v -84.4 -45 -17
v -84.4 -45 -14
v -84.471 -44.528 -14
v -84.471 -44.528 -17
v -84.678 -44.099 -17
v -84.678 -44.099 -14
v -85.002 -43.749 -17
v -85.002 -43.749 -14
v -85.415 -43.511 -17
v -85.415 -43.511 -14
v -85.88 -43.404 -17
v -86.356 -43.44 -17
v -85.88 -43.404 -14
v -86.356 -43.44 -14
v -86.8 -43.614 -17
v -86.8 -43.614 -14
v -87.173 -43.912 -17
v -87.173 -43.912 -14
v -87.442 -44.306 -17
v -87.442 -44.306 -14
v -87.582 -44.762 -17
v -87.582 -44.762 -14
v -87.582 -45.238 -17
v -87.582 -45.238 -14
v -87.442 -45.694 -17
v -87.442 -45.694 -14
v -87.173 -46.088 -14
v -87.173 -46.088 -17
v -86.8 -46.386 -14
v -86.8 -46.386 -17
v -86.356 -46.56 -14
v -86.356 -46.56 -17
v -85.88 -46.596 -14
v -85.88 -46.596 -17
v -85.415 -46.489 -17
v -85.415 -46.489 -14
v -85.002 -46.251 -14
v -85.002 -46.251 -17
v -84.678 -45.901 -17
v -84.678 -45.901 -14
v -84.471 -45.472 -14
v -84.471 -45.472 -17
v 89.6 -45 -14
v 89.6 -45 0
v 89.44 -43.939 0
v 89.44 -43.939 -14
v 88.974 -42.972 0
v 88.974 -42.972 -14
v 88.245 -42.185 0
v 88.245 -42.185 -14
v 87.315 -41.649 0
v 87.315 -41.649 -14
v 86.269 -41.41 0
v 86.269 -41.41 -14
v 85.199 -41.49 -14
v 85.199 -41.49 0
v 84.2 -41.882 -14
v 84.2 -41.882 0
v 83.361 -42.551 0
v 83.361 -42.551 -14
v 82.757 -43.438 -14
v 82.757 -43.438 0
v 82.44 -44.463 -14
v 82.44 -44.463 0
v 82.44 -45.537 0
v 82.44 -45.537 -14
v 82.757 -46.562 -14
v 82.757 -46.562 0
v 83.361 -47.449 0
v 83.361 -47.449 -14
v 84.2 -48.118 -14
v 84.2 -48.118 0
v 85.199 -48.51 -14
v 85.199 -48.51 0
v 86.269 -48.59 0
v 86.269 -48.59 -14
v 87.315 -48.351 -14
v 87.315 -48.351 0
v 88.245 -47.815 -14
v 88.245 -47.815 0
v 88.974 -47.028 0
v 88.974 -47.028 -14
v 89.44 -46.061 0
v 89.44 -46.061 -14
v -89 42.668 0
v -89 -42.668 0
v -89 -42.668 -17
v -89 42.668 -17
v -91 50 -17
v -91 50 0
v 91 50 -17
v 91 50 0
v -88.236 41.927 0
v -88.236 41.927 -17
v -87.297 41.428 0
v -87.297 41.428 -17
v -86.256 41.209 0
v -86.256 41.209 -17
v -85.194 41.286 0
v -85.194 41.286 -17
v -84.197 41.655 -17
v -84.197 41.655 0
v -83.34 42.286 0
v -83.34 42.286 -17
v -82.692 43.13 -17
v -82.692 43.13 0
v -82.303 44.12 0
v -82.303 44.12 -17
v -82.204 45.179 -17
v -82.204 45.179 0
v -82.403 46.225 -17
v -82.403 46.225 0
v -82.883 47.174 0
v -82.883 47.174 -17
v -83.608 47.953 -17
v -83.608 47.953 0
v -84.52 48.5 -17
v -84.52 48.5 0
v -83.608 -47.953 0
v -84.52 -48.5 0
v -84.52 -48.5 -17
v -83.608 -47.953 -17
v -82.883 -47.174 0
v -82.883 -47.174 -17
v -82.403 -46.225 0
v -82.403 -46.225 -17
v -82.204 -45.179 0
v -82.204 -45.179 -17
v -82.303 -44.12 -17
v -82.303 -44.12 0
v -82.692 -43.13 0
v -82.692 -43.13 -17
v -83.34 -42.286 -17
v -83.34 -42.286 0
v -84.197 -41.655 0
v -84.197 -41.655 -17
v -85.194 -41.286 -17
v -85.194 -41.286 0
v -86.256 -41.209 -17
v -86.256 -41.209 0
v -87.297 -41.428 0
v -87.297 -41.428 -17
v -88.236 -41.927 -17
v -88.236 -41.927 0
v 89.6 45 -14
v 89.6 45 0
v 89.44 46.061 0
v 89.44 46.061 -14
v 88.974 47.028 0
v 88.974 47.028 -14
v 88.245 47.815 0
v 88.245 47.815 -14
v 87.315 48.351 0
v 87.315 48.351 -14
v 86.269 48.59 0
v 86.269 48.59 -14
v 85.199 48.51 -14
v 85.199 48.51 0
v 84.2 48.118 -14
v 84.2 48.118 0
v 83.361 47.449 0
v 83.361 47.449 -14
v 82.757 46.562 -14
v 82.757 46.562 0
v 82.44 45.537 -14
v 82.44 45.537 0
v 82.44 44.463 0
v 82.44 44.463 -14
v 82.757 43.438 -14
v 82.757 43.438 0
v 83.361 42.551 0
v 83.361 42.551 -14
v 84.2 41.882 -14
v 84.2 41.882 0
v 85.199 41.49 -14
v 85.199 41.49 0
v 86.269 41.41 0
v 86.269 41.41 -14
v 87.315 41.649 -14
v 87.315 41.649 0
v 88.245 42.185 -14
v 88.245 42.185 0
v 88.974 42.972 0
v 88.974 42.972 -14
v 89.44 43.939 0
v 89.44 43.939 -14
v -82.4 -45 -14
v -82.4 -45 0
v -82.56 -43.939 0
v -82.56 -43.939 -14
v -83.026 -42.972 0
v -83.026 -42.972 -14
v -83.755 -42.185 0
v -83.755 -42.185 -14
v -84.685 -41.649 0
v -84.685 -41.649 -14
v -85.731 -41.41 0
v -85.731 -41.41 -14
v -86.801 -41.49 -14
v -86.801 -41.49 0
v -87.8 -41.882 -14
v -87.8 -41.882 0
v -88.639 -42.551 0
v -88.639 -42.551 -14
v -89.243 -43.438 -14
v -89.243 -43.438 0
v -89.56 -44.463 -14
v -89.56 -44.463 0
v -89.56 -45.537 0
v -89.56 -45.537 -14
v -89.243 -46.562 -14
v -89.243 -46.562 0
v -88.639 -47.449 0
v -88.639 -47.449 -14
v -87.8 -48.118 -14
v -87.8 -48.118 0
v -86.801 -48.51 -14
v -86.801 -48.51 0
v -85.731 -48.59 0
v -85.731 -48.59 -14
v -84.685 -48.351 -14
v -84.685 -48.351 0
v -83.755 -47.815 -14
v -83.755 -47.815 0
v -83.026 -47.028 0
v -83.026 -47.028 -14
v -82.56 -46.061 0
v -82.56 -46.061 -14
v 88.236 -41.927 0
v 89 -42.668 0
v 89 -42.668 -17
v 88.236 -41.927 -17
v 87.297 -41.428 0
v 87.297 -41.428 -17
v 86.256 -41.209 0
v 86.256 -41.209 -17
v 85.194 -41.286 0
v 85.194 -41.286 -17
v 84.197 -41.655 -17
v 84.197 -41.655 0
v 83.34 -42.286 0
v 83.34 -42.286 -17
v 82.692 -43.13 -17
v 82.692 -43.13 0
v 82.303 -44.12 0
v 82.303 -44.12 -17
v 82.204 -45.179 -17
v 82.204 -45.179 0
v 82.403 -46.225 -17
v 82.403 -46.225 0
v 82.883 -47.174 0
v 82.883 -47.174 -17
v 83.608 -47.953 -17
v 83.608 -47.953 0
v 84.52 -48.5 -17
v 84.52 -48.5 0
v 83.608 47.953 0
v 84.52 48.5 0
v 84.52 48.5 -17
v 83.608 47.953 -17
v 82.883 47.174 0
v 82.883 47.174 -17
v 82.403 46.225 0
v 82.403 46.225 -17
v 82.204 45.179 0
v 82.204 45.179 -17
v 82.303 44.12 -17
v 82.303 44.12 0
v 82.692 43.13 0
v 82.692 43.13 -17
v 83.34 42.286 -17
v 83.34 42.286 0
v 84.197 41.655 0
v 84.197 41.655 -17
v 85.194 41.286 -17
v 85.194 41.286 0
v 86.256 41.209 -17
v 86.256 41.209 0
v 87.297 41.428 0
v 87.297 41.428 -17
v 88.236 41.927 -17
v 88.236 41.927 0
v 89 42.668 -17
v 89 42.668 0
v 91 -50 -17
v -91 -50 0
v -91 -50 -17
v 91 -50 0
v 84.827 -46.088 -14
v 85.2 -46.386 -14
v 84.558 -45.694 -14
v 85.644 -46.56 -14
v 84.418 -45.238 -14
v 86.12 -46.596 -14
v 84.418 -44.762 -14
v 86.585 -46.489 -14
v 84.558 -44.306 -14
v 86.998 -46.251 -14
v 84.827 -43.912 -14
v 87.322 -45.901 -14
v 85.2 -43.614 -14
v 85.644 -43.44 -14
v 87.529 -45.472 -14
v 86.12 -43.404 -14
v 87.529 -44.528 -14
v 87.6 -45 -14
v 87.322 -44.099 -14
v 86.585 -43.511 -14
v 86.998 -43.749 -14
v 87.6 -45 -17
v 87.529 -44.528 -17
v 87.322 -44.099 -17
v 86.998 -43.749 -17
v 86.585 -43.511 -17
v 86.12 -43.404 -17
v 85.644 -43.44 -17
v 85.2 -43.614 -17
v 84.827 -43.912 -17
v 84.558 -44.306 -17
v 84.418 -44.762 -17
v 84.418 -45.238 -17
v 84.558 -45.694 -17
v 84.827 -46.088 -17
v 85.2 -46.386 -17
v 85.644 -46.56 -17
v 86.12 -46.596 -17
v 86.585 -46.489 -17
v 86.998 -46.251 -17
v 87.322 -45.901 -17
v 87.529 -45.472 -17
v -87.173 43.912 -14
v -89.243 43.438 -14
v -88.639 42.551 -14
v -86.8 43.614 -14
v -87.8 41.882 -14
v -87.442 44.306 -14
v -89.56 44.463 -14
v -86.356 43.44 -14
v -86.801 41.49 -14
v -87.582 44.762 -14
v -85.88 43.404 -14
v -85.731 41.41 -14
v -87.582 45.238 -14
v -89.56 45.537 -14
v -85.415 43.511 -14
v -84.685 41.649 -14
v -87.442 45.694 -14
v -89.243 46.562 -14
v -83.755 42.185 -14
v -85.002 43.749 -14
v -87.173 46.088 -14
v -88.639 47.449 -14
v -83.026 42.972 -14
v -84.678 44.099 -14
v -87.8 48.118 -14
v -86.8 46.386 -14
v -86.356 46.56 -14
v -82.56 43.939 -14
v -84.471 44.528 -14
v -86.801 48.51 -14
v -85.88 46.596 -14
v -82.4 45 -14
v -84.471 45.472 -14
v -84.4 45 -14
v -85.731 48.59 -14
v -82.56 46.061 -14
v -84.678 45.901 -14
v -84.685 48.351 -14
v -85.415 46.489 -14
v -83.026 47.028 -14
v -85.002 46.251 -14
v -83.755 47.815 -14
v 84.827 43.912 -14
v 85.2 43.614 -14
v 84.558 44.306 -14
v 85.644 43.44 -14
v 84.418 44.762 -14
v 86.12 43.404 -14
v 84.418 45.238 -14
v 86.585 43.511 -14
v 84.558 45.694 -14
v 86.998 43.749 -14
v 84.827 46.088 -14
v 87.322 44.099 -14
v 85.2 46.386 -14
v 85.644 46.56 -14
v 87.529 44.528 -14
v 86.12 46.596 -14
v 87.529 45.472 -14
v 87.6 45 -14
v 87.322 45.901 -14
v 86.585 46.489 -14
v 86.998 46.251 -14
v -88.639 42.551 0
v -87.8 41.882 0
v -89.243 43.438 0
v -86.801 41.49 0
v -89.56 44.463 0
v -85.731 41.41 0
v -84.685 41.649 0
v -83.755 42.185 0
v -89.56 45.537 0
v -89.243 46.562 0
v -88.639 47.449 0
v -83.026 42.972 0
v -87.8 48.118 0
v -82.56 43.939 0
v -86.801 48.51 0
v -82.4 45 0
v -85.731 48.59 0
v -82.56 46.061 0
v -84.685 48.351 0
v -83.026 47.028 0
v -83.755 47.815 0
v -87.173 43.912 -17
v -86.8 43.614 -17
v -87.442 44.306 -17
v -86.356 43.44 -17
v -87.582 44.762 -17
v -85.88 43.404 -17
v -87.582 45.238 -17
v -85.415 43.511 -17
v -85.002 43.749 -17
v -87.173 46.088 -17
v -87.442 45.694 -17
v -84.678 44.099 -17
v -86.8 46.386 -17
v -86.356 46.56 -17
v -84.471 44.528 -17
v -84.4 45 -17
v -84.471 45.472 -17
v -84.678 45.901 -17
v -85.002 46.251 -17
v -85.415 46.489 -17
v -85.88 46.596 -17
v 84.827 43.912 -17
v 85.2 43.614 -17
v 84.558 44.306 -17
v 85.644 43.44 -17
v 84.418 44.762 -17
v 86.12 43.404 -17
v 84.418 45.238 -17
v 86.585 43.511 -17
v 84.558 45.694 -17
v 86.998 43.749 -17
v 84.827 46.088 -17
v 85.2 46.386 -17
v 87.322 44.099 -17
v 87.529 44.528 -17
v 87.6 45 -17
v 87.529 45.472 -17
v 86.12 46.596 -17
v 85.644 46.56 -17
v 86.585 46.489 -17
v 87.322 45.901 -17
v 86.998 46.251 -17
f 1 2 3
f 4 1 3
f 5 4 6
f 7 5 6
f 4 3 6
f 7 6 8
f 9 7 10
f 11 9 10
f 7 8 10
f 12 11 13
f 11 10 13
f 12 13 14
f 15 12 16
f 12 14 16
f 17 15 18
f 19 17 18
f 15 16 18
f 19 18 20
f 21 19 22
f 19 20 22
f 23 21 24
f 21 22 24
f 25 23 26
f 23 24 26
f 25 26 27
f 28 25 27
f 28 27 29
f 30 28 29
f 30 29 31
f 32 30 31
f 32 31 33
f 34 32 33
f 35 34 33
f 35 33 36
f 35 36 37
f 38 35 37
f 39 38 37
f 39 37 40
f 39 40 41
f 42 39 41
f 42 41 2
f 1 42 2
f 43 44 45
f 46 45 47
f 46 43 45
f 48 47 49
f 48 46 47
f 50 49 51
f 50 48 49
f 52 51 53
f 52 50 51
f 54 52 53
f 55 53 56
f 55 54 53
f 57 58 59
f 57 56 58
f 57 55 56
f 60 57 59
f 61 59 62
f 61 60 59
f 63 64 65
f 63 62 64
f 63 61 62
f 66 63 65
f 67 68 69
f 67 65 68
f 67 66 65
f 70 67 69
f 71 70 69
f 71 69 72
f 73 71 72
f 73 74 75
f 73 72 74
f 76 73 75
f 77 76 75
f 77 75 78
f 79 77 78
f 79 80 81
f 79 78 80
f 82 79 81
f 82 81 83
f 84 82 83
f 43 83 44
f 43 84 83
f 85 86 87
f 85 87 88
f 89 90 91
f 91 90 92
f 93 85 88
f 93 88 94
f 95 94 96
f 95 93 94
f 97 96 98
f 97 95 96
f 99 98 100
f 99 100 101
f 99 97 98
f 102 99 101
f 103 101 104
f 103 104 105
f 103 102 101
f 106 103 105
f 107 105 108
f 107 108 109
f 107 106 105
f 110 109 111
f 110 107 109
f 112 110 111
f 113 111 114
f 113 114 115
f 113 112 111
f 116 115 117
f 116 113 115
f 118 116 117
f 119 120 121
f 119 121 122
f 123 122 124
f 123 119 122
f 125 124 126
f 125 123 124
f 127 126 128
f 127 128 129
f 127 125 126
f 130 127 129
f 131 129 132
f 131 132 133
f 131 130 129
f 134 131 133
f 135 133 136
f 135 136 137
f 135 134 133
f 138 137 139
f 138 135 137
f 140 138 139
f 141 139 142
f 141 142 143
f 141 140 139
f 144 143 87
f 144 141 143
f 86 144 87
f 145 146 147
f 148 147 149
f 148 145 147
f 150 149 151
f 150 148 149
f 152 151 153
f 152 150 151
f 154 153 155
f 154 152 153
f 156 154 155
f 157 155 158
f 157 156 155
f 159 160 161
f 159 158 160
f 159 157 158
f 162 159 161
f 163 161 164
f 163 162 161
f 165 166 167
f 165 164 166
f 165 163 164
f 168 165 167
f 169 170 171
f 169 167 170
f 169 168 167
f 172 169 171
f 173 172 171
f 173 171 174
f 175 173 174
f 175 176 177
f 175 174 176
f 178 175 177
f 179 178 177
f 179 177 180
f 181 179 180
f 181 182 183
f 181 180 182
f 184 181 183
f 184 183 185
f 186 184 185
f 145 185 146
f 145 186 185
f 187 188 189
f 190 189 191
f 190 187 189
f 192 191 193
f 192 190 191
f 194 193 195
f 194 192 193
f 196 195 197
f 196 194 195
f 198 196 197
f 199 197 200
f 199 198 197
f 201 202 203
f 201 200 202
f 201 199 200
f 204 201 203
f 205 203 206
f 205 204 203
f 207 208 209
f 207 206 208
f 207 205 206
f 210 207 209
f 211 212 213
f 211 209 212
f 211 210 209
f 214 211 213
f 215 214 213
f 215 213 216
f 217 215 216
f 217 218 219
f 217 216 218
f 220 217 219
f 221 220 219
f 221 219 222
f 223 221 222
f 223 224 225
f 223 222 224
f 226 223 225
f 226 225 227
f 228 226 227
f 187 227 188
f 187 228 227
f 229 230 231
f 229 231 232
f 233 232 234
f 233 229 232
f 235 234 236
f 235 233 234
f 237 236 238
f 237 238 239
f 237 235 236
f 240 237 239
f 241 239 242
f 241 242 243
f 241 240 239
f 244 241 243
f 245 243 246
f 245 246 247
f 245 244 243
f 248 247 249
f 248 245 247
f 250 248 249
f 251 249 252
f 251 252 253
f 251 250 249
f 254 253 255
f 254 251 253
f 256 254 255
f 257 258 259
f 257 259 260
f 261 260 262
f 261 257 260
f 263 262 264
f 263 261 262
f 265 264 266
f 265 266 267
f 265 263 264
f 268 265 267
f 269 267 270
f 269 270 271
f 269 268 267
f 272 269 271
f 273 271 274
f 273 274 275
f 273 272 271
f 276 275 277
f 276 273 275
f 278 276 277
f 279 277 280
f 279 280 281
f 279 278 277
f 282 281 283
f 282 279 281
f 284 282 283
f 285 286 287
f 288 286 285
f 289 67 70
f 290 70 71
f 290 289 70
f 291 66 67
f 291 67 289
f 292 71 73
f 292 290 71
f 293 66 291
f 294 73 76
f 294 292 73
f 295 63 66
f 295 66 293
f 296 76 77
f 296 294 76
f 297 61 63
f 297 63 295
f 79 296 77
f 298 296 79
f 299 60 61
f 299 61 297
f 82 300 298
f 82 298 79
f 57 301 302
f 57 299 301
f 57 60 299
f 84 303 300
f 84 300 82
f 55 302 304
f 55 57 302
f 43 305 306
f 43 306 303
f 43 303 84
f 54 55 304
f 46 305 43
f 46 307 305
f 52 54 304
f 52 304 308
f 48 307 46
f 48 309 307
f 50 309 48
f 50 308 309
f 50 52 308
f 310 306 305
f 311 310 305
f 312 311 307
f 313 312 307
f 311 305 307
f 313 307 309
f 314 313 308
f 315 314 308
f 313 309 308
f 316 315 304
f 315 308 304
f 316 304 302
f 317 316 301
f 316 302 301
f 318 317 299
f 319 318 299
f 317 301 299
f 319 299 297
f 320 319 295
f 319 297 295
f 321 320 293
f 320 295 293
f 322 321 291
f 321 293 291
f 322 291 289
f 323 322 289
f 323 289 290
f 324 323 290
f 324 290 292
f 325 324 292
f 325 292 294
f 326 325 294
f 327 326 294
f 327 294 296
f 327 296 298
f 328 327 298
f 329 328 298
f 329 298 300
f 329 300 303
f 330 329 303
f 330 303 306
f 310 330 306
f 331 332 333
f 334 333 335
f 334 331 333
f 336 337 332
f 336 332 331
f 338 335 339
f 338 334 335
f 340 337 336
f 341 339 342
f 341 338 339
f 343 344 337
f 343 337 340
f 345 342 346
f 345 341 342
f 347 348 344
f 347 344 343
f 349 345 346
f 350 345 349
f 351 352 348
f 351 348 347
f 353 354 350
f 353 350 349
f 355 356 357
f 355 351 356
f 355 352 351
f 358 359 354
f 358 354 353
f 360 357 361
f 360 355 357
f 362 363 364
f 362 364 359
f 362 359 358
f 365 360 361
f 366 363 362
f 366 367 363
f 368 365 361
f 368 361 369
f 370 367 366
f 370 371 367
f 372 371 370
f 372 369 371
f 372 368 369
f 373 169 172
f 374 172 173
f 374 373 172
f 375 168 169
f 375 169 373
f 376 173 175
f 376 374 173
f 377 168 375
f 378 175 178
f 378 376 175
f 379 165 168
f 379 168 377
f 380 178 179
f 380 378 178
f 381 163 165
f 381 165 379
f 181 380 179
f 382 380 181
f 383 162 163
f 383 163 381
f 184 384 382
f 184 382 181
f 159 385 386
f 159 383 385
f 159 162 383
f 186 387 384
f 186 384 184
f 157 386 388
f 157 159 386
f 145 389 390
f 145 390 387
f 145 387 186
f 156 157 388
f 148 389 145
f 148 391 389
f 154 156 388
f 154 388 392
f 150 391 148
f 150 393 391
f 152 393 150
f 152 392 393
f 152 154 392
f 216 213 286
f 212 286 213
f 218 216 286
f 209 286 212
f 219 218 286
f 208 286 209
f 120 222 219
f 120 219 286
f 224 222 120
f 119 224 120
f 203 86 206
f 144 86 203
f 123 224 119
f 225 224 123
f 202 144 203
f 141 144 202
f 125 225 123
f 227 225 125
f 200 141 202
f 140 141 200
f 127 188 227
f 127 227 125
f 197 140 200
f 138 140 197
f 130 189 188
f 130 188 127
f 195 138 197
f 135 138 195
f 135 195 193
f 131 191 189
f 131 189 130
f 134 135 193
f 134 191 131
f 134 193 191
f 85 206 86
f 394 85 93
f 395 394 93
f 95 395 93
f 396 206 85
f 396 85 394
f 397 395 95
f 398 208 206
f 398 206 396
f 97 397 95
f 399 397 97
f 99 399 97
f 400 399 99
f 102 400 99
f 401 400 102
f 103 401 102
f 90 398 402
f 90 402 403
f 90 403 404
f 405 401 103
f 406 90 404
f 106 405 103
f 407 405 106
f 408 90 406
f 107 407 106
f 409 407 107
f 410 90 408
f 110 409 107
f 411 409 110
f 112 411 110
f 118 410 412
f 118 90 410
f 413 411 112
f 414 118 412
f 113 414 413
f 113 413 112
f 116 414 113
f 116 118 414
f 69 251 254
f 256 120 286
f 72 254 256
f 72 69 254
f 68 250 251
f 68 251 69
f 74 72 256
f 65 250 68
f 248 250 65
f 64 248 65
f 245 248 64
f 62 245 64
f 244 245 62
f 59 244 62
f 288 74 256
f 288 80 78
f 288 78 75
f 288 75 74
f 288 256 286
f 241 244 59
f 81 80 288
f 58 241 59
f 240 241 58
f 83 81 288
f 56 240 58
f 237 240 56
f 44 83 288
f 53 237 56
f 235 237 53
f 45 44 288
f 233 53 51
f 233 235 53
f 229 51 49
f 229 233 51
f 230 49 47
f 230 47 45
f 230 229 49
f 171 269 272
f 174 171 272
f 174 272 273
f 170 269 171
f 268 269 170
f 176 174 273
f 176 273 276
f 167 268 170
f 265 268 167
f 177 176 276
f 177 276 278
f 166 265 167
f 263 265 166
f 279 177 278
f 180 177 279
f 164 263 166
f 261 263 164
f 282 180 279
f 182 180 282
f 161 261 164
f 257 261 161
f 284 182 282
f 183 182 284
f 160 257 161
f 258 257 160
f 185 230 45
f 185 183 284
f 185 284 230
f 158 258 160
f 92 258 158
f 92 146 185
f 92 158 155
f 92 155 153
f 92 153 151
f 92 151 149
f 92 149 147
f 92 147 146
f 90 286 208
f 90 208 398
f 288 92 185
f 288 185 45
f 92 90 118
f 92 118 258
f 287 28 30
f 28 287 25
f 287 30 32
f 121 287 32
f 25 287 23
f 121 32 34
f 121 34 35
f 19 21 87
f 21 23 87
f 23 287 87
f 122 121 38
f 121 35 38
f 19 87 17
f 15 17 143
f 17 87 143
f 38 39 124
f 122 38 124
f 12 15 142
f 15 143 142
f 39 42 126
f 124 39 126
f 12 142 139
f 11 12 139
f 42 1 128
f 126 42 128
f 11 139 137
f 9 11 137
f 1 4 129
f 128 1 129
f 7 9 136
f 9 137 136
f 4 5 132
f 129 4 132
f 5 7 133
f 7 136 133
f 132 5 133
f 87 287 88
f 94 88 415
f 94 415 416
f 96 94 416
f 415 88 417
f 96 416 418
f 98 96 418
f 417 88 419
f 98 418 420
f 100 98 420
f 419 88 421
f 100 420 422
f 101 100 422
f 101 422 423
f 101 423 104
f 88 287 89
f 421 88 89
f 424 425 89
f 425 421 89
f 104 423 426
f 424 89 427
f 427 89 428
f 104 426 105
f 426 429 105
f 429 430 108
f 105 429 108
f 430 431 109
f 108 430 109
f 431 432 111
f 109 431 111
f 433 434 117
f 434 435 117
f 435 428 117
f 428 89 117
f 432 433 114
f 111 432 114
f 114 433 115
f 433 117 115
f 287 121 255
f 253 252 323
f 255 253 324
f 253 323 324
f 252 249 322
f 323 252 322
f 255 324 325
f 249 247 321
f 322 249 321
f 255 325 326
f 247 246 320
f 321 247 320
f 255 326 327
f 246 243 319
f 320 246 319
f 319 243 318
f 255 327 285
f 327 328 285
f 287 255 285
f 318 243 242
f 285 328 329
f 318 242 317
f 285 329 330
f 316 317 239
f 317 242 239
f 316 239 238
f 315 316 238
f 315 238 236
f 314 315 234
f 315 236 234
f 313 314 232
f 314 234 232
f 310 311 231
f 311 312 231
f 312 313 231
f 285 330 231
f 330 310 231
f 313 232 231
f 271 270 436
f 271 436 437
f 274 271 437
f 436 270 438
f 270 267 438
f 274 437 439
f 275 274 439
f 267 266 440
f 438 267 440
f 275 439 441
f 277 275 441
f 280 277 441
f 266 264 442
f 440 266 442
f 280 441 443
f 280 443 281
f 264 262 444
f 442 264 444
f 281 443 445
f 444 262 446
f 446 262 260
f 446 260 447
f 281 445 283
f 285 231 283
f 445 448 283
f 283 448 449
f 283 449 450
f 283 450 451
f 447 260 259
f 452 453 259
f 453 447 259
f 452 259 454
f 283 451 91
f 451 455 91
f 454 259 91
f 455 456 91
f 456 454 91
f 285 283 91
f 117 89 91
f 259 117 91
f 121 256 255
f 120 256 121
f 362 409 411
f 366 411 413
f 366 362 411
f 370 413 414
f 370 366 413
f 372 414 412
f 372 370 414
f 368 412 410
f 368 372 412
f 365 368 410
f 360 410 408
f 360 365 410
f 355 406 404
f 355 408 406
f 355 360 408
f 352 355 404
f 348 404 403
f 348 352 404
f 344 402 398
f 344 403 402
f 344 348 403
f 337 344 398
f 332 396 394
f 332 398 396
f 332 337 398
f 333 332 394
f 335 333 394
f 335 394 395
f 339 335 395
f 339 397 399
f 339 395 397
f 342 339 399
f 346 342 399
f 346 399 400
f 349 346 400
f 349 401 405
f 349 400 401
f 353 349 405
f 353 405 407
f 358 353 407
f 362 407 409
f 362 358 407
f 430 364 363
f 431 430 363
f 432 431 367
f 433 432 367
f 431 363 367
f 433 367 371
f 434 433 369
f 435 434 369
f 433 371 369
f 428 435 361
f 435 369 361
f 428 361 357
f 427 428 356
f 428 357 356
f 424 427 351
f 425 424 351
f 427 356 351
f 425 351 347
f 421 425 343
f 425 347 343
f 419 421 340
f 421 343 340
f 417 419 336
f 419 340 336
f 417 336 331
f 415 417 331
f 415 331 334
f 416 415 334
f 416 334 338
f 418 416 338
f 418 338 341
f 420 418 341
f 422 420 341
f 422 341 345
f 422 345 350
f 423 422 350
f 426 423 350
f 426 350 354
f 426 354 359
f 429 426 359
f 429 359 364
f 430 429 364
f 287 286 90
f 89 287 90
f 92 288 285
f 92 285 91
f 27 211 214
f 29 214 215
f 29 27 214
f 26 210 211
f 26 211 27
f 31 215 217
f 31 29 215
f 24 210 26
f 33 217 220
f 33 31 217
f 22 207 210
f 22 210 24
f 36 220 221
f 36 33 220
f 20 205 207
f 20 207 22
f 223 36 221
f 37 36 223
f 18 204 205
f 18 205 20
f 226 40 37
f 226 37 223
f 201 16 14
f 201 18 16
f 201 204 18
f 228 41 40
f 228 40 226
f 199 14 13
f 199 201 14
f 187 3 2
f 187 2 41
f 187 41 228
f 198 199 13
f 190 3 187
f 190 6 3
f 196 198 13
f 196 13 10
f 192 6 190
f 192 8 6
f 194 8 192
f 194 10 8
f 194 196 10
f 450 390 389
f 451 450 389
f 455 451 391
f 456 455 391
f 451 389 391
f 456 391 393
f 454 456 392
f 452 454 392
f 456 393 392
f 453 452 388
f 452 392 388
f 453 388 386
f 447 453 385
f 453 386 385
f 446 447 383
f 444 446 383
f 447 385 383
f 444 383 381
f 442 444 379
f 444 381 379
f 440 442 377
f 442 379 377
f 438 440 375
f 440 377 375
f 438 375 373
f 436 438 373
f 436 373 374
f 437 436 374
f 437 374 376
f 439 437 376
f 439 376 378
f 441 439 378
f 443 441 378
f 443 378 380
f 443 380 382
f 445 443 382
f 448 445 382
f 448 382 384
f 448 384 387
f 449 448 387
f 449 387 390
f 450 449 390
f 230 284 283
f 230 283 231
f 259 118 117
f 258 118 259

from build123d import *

# Parameters (mm, degrees)
CYLINDER003_R     = 3.6
CYLINDER003_DEPTH = 18
CYLINDER002_R     = 3.6
CYLINDER002_DEPTH = 18
CYLINDER001_R     = 3.6
CYLINDER001_DEPTH = 18
CYLINDER_R        = 3.6
CYLINDER_DEPTH    = 18
SKETCH_W          = 182
SKETCH_H          = 100
SKETCH_R          = 1.6
EXTRUDE001_DEPTH  = 17


with BuildPart() as zylinder003:
    # Cylinder003 → Cylinder003 (new body)
    with BuildSketch(Plane(origin=(86, -45, -14), x_dir=(1, 0, 0), z_dir=(0, 0, 1))):
        Circle(CYLINDER003_R)
    extrude(amount=CYLINDER003_DEPTH)


with BuildPart() as zylinder002:
    # Cylinder002 → Cylinder002 (new body)
    with BuildSketch(Plane(origin=(86, 45, -14), x_dir=(1, 0, 0), z_dir=(0, 0, 1))):
        Circle(CYLINDER002_R)
    extrude(amount=CYLINDER002_DEPTH)


with BuildPart() as zylinder001:
    # Cylinder001 → Cylinder001 (new body)
    with BuildSketch(Plane(origin=(-86, 45, -14), x_dir=(1, 0, 0), z_dir=(0, 0, 1))):
        Circle(CYLINDER001_R)
    extrude(amount=CYLINDER001_DEPTH)


with BuildPart() as fusion:
    # Cylinder → Cylinder (new body)
    with BuildSketch(Plane(origin=(-86, -45, -14), x_dir=(1, 0, 0), z_dir=(0, 0, 1))):
        Circle(CYLINDER_R)
    extrude(amount=CYLINDER_DEPTH)

    # Fusion: union Zylinder003, Zylinder002, Zylinder001
    add(zylinder003.part)
    add(zylinder002.part)
    add(zylinder001.part)


with BuildPart() as cut_aussen:
    # Sketch → Extrude001 (new body)
    with BuildSketch(Plane.XY):
        Rectangle(SKETCH_W, SKETCH_H)
        with Locations((-86, 45)):
            Circle(SKETCH_R, mode=Mode.SUBTRACT)
        with Locations((86, 45)):
            Circle(SKETCH_R, mode=Mode.SUBTRACT)
        with Locations((86, -45)):
            Circle(SKETCH_R, mode=Mode.SUBTRACT)
        with Locations((-86, -45)):
            Circle(SKETCH_R, mode=Mode.SUBTRACT)
        with BuildLine():
            Line((-84.520135, 48.5), (84.520135, 48.5))
            ThreePointArc((84.520135, 48.5), (82.986386, 42.685236), (89, 42.667619))
            Line((89, 42.667619), (89, -42.667619))
            ThreePointArc((89, -42.667619), (82.986386, -42.685236), (84.520135, -48.5))
            Line((84.520135, -48.5), (-84.520135, -48.5))
            ThreePointArc((-84.520135, -48.5), (-82.986386, -42.685236), (-89, -42.667619))
            Line((-89, -42.667619), (-89, 42.667619))
            ThreePointArc((-89, 42.667619), (-82.986386, 42.685236), (-84.520135, 48.5))
        make_face(mode=Mode.SUBTRACT)
    extrude(amount=-EXTRUDE001_DEPTH)

    # Cut006: cut Fusion
    add(fusion.part, mode=Mode.SUBTRACT)


solid = cut_aussen.part
